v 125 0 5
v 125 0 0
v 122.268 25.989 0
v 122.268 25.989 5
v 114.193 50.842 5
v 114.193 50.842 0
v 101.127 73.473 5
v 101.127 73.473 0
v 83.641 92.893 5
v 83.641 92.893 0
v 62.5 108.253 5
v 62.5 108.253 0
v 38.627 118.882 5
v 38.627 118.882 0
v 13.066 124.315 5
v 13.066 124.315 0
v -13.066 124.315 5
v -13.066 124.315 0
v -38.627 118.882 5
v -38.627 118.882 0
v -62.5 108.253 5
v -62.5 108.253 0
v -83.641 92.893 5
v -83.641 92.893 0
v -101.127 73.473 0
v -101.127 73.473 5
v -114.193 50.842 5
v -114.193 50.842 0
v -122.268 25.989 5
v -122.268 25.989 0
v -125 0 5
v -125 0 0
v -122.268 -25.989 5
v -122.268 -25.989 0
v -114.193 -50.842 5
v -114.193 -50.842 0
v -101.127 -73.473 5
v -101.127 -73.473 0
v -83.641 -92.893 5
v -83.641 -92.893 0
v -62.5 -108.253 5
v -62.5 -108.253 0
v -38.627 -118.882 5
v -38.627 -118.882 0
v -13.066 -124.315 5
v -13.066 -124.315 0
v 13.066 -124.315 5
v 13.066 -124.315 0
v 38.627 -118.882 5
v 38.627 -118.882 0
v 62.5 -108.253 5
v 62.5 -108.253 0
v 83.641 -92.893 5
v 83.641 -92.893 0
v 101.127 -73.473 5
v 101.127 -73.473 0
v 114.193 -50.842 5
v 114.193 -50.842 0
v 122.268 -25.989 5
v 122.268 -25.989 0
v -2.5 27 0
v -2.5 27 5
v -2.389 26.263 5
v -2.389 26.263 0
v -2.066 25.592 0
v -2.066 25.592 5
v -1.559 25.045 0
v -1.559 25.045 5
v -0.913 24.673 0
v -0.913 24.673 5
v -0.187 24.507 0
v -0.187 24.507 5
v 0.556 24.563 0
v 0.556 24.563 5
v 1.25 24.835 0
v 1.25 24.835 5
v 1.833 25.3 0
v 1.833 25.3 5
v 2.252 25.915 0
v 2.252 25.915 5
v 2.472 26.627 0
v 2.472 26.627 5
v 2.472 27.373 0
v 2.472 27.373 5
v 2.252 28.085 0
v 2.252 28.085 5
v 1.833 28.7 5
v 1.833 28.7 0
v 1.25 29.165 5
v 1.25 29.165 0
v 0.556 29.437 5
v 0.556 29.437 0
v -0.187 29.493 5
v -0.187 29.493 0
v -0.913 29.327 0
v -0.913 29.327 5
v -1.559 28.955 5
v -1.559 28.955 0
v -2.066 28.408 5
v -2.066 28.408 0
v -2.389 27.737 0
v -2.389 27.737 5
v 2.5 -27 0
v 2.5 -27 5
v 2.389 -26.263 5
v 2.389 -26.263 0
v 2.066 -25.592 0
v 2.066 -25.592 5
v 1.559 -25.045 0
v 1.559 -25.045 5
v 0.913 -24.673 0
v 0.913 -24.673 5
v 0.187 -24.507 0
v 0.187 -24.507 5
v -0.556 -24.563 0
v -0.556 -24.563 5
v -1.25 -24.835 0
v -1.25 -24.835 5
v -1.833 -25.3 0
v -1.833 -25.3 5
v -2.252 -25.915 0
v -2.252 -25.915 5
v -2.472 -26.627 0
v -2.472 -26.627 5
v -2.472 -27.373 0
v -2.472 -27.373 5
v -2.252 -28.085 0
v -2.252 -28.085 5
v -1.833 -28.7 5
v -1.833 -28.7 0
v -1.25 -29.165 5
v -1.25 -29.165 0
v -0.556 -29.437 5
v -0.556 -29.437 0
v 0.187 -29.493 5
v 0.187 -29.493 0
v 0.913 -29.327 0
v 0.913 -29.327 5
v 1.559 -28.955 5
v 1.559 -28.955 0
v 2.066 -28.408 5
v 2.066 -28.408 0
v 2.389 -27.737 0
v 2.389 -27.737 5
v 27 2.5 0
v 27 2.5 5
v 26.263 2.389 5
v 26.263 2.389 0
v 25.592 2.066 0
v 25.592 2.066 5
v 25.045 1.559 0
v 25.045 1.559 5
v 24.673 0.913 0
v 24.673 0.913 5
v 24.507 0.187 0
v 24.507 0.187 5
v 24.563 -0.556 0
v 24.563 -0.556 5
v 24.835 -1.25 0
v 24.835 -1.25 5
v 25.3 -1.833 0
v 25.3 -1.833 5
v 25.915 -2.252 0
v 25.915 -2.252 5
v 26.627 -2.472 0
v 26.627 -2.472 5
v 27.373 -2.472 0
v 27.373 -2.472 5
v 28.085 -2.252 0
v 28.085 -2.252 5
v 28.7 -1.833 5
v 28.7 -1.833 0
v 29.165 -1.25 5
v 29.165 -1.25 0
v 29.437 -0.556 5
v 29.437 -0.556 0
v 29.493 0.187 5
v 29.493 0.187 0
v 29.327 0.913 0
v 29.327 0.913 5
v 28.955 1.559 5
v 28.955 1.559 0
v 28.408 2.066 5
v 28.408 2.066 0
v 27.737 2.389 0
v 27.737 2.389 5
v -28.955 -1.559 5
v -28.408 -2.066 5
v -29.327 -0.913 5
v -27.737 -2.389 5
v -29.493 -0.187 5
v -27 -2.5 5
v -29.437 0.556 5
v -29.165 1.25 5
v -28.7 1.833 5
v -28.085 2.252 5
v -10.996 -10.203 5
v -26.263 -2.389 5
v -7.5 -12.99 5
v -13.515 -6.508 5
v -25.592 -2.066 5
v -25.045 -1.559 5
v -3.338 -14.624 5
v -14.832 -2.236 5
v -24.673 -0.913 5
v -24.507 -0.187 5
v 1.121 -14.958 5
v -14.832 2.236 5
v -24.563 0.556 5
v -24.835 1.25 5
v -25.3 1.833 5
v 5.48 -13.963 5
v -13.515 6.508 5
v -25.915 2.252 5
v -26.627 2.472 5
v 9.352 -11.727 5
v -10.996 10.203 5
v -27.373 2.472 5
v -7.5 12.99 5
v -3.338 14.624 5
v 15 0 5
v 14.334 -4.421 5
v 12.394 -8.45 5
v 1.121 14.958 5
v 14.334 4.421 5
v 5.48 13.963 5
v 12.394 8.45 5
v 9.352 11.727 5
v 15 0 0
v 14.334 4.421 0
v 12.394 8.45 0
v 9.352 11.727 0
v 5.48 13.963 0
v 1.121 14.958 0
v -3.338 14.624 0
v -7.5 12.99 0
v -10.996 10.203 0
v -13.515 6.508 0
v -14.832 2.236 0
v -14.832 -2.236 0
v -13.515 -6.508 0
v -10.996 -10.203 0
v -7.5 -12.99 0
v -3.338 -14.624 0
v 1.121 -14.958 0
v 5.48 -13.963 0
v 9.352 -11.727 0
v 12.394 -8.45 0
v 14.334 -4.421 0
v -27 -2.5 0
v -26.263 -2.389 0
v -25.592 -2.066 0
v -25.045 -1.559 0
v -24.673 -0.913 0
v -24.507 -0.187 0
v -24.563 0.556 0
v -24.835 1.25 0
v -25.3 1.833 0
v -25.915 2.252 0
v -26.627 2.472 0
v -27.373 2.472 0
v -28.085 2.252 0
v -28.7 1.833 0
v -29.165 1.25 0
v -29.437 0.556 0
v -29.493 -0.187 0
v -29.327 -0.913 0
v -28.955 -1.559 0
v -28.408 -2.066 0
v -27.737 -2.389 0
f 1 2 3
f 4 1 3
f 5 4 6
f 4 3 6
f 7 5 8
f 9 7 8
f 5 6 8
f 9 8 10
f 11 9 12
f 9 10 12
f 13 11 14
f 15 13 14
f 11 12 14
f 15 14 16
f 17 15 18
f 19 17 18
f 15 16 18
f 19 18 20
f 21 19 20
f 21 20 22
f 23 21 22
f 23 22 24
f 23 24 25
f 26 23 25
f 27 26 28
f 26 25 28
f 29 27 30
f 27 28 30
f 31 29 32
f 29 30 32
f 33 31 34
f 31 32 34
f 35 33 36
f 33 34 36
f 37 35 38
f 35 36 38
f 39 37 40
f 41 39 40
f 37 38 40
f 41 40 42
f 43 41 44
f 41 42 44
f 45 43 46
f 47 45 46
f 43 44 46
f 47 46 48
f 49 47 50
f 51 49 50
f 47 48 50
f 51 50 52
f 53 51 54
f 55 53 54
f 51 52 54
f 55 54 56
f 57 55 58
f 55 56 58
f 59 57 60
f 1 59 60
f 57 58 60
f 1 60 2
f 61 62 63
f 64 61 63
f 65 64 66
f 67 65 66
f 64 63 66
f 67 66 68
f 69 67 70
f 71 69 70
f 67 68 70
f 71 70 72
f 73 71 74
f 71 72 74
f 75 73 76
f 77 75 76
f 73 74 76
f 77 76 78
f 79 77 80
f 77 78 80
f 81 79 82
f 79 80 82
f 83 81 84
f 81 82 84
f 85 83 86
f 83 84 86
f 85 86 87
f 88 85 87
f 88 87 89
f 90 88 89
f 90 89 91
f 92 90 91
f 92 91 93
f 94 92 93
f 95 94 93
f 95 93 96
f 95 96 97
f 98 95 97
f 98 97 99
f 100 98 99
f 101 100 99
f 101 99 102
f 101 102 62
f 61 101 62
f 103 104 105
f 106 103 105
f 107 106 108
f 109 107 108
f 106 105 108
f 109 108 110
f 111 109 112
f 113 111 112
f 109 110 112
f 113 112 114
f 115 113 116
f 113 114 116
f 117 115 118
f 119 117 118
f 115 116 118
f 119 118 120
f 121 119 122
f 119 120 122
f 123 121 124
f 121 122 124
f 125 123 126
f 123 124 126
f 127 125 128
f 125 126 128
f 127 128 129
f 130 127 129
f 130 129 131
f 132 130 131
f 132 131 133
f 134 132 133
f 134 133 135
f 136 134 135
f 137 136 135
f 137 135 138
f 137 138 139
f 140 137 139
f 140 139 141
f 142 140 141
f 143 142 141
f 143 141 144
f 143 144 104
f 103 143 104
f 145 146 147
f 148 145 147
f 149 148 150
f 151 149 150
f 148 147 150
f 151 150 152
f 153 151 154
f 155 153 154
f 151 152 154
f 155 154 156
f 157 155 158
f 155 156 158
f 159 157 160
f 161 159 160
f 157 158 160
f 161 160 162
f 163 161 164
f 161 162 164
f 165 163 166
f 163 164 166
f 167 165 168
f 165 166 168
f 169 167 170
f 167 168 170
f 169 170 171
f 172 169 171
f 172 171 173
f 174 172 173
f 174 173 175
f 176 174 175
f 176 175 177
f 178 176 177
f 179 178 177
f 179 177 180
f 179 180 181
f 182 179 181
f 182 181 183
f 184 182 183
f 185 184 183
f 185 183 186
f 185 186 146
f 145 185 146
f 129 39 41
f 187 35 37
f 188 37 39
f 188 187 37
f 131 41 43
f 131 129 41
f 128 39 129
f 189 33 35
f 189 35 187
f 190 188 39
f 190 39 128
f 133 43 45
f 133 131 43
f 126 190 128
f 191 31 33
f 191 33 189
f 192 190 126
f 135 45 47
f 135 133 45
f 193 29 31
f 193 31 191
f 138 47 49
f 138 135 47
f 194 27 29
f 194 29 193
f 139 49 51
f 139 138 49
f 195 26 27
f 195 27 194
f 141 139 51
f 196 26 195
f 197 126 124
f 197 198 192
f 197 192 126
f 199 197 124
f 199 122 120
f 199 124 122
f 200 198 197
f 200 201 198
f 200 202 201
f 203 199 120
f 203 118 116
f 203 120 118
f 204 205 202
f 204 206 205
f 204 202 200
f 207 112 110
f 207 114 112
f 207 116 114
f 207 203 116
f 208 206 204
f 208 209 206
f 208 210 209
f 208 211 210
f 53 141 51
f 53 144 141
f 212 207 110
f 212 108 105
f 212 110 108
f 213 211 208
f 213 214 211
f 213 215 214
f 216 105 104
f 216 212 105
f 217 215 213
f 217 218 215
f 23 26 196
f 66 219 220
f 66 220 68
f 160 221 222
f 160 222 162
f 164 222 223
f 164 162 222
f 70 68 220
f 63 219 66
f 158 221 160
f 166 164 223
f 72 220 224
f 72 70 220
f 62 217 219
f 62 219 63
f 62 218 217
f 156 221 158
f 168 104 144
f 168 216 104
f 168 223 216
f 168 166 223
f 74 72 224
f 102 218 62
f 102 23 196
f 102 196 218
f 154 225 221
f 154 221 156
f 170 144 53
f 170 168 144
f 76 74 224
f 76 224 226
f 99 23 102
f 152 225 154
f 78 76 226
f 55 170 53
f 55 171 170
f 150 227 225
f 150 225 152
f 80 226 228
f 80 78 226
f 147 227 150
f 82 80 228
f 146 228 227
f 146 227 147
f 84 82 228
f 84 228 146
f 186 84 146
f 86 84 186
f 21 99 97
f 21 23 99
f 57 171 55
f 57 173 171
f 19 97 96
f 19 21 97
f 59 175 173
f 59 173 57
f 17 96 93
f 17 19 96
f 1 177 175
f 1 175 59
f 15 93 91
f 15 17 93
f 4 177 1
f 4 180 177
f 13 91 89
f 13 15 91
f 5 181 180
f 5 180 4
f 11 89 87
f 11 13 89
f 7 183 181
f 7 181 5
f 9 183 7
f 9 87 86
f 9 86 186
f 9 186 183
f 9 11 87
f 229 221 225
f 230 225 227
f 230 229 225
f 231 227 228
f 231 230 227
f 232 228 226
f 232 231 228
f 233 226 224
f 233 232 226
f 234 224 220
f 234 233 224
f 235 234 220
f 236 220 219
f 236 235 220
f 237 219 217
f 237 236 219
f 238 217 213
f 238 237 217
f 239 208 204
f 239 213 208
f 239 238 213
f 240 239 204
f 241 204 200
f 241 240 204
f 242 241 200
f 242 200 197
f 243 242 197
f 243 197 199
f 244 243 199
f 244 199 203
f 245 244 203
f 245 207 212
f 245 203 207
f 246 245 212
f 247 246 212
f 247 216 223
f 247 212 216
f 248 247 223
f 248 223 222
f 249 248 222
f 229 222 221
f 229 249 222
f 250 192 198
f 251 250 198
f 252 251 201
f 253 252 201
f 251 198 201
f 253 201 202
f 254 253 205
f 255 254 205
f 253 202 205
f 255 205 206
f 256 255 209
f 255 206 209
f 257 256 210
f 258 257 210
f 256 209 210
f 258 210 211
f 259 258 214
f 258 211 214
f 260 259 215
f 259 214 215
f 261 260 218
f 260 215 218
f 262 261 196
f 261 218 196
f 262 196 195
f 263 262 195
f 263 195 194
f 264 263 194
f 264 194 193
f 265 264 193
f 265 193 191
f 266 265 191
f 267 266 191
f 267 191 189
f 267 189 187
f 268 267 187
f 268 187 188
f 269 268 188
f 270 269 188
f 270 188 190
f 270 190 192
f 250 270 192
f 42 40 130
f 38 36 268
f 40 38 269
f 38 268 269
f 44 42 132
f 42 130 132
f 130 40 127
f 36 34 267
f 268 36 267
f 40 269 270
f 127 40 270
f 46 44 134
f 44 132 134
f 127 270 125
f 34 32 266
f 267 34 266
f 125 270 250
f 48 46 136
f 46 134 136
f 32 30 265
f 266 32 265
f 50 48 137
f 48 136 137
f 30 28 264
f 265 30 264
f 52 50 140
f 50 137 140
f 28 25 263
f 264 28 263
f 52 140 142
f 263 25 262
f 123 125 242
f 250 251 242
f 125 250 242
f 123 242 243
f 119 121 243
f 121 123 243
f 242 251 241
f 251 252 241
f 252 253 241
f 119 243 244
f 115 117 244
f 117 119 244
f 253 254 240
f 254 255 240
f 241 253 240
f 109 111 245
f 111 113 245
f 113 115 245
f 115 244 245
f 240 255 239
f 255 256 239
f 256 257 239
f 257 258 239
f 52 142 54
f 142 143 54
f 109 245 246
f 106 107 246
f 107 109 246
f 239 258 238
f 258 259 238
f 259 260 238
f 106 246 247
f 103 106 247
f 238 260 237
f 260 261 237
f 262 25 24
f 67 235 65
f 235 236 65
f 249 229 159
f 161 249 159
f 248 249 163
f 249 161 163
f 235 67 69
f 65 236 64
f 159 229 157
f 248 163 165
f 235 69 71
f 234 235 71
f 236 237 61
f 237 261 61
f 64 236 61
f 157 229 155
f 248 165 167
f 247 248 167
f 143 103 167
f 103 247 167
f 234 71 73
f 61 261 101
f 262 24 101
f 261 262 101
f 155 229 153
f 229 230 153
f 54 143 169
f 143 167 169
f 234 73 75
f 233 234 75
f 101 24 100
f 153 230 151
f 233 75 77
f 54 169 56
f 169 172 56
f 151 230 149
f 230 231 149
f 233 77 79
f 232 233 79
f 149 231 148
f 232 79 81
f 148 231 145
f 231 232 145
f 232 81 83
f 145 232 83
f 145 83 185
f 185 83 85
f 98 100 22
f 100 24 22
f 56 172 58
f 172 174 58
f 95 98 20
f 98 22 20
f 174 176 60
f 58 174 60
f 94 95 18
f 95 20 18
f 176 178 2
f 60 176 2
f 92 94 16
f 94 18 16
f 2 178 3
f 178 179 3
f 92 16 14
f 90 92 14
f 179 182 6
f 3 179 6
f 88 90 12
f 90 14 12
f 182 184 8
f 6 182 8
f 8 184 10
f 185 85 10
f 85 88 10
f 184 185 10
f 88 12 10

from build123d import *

# Parameters (mm, degrees)
F0_R            = 125
F2_DEPTH        = 5
F1_R            = 15
F3_DEPTH        = 5.001
F5_D            = 5
F5_COPIES_COUNT = 4


# Not quite as in the source:
# - a pattern or mirror of a feature is missing from the dataset's text; its kind, count and spacing are read off the source's solid
# - a feature names something its author has since deleted; it is built from what else it names


with BuildPart() as f2:
    # F0 (on Top) → F2 (new body)
    with BuildSketch(Plane.XY):
        Circle(F0_R)
    extrude(amount=F2_DEPTH)

    # F1 (on Top) → F3 (cut, through all)
    with BuildSketch(Plane.XY):
        Circle(F1_R)
    extrude(amount=F3_DEPTH, mode=Mode.SUBTRACT)

    # F5 (through all)
    with Locations(Plane(origin=(0, 0, 0), x_dir=(1, 0, 0), z_dir=(0, 0, -1))):
        with Locations((0, -27)):
            f5 = Hole(F5_D / 2)

    # F5_copies: F5 ×4 about axis
    f5_copies_axis = Axis((0, 0, 0), (0, 0, 1))
    for i in range(1, F5_COPIES_COUNT):
        add(f5.rotate(f5_copies_axis, i * 360 / F5_COPIES_COUNT), mode=Mode.SUBTRACT)


solid = f2.part
